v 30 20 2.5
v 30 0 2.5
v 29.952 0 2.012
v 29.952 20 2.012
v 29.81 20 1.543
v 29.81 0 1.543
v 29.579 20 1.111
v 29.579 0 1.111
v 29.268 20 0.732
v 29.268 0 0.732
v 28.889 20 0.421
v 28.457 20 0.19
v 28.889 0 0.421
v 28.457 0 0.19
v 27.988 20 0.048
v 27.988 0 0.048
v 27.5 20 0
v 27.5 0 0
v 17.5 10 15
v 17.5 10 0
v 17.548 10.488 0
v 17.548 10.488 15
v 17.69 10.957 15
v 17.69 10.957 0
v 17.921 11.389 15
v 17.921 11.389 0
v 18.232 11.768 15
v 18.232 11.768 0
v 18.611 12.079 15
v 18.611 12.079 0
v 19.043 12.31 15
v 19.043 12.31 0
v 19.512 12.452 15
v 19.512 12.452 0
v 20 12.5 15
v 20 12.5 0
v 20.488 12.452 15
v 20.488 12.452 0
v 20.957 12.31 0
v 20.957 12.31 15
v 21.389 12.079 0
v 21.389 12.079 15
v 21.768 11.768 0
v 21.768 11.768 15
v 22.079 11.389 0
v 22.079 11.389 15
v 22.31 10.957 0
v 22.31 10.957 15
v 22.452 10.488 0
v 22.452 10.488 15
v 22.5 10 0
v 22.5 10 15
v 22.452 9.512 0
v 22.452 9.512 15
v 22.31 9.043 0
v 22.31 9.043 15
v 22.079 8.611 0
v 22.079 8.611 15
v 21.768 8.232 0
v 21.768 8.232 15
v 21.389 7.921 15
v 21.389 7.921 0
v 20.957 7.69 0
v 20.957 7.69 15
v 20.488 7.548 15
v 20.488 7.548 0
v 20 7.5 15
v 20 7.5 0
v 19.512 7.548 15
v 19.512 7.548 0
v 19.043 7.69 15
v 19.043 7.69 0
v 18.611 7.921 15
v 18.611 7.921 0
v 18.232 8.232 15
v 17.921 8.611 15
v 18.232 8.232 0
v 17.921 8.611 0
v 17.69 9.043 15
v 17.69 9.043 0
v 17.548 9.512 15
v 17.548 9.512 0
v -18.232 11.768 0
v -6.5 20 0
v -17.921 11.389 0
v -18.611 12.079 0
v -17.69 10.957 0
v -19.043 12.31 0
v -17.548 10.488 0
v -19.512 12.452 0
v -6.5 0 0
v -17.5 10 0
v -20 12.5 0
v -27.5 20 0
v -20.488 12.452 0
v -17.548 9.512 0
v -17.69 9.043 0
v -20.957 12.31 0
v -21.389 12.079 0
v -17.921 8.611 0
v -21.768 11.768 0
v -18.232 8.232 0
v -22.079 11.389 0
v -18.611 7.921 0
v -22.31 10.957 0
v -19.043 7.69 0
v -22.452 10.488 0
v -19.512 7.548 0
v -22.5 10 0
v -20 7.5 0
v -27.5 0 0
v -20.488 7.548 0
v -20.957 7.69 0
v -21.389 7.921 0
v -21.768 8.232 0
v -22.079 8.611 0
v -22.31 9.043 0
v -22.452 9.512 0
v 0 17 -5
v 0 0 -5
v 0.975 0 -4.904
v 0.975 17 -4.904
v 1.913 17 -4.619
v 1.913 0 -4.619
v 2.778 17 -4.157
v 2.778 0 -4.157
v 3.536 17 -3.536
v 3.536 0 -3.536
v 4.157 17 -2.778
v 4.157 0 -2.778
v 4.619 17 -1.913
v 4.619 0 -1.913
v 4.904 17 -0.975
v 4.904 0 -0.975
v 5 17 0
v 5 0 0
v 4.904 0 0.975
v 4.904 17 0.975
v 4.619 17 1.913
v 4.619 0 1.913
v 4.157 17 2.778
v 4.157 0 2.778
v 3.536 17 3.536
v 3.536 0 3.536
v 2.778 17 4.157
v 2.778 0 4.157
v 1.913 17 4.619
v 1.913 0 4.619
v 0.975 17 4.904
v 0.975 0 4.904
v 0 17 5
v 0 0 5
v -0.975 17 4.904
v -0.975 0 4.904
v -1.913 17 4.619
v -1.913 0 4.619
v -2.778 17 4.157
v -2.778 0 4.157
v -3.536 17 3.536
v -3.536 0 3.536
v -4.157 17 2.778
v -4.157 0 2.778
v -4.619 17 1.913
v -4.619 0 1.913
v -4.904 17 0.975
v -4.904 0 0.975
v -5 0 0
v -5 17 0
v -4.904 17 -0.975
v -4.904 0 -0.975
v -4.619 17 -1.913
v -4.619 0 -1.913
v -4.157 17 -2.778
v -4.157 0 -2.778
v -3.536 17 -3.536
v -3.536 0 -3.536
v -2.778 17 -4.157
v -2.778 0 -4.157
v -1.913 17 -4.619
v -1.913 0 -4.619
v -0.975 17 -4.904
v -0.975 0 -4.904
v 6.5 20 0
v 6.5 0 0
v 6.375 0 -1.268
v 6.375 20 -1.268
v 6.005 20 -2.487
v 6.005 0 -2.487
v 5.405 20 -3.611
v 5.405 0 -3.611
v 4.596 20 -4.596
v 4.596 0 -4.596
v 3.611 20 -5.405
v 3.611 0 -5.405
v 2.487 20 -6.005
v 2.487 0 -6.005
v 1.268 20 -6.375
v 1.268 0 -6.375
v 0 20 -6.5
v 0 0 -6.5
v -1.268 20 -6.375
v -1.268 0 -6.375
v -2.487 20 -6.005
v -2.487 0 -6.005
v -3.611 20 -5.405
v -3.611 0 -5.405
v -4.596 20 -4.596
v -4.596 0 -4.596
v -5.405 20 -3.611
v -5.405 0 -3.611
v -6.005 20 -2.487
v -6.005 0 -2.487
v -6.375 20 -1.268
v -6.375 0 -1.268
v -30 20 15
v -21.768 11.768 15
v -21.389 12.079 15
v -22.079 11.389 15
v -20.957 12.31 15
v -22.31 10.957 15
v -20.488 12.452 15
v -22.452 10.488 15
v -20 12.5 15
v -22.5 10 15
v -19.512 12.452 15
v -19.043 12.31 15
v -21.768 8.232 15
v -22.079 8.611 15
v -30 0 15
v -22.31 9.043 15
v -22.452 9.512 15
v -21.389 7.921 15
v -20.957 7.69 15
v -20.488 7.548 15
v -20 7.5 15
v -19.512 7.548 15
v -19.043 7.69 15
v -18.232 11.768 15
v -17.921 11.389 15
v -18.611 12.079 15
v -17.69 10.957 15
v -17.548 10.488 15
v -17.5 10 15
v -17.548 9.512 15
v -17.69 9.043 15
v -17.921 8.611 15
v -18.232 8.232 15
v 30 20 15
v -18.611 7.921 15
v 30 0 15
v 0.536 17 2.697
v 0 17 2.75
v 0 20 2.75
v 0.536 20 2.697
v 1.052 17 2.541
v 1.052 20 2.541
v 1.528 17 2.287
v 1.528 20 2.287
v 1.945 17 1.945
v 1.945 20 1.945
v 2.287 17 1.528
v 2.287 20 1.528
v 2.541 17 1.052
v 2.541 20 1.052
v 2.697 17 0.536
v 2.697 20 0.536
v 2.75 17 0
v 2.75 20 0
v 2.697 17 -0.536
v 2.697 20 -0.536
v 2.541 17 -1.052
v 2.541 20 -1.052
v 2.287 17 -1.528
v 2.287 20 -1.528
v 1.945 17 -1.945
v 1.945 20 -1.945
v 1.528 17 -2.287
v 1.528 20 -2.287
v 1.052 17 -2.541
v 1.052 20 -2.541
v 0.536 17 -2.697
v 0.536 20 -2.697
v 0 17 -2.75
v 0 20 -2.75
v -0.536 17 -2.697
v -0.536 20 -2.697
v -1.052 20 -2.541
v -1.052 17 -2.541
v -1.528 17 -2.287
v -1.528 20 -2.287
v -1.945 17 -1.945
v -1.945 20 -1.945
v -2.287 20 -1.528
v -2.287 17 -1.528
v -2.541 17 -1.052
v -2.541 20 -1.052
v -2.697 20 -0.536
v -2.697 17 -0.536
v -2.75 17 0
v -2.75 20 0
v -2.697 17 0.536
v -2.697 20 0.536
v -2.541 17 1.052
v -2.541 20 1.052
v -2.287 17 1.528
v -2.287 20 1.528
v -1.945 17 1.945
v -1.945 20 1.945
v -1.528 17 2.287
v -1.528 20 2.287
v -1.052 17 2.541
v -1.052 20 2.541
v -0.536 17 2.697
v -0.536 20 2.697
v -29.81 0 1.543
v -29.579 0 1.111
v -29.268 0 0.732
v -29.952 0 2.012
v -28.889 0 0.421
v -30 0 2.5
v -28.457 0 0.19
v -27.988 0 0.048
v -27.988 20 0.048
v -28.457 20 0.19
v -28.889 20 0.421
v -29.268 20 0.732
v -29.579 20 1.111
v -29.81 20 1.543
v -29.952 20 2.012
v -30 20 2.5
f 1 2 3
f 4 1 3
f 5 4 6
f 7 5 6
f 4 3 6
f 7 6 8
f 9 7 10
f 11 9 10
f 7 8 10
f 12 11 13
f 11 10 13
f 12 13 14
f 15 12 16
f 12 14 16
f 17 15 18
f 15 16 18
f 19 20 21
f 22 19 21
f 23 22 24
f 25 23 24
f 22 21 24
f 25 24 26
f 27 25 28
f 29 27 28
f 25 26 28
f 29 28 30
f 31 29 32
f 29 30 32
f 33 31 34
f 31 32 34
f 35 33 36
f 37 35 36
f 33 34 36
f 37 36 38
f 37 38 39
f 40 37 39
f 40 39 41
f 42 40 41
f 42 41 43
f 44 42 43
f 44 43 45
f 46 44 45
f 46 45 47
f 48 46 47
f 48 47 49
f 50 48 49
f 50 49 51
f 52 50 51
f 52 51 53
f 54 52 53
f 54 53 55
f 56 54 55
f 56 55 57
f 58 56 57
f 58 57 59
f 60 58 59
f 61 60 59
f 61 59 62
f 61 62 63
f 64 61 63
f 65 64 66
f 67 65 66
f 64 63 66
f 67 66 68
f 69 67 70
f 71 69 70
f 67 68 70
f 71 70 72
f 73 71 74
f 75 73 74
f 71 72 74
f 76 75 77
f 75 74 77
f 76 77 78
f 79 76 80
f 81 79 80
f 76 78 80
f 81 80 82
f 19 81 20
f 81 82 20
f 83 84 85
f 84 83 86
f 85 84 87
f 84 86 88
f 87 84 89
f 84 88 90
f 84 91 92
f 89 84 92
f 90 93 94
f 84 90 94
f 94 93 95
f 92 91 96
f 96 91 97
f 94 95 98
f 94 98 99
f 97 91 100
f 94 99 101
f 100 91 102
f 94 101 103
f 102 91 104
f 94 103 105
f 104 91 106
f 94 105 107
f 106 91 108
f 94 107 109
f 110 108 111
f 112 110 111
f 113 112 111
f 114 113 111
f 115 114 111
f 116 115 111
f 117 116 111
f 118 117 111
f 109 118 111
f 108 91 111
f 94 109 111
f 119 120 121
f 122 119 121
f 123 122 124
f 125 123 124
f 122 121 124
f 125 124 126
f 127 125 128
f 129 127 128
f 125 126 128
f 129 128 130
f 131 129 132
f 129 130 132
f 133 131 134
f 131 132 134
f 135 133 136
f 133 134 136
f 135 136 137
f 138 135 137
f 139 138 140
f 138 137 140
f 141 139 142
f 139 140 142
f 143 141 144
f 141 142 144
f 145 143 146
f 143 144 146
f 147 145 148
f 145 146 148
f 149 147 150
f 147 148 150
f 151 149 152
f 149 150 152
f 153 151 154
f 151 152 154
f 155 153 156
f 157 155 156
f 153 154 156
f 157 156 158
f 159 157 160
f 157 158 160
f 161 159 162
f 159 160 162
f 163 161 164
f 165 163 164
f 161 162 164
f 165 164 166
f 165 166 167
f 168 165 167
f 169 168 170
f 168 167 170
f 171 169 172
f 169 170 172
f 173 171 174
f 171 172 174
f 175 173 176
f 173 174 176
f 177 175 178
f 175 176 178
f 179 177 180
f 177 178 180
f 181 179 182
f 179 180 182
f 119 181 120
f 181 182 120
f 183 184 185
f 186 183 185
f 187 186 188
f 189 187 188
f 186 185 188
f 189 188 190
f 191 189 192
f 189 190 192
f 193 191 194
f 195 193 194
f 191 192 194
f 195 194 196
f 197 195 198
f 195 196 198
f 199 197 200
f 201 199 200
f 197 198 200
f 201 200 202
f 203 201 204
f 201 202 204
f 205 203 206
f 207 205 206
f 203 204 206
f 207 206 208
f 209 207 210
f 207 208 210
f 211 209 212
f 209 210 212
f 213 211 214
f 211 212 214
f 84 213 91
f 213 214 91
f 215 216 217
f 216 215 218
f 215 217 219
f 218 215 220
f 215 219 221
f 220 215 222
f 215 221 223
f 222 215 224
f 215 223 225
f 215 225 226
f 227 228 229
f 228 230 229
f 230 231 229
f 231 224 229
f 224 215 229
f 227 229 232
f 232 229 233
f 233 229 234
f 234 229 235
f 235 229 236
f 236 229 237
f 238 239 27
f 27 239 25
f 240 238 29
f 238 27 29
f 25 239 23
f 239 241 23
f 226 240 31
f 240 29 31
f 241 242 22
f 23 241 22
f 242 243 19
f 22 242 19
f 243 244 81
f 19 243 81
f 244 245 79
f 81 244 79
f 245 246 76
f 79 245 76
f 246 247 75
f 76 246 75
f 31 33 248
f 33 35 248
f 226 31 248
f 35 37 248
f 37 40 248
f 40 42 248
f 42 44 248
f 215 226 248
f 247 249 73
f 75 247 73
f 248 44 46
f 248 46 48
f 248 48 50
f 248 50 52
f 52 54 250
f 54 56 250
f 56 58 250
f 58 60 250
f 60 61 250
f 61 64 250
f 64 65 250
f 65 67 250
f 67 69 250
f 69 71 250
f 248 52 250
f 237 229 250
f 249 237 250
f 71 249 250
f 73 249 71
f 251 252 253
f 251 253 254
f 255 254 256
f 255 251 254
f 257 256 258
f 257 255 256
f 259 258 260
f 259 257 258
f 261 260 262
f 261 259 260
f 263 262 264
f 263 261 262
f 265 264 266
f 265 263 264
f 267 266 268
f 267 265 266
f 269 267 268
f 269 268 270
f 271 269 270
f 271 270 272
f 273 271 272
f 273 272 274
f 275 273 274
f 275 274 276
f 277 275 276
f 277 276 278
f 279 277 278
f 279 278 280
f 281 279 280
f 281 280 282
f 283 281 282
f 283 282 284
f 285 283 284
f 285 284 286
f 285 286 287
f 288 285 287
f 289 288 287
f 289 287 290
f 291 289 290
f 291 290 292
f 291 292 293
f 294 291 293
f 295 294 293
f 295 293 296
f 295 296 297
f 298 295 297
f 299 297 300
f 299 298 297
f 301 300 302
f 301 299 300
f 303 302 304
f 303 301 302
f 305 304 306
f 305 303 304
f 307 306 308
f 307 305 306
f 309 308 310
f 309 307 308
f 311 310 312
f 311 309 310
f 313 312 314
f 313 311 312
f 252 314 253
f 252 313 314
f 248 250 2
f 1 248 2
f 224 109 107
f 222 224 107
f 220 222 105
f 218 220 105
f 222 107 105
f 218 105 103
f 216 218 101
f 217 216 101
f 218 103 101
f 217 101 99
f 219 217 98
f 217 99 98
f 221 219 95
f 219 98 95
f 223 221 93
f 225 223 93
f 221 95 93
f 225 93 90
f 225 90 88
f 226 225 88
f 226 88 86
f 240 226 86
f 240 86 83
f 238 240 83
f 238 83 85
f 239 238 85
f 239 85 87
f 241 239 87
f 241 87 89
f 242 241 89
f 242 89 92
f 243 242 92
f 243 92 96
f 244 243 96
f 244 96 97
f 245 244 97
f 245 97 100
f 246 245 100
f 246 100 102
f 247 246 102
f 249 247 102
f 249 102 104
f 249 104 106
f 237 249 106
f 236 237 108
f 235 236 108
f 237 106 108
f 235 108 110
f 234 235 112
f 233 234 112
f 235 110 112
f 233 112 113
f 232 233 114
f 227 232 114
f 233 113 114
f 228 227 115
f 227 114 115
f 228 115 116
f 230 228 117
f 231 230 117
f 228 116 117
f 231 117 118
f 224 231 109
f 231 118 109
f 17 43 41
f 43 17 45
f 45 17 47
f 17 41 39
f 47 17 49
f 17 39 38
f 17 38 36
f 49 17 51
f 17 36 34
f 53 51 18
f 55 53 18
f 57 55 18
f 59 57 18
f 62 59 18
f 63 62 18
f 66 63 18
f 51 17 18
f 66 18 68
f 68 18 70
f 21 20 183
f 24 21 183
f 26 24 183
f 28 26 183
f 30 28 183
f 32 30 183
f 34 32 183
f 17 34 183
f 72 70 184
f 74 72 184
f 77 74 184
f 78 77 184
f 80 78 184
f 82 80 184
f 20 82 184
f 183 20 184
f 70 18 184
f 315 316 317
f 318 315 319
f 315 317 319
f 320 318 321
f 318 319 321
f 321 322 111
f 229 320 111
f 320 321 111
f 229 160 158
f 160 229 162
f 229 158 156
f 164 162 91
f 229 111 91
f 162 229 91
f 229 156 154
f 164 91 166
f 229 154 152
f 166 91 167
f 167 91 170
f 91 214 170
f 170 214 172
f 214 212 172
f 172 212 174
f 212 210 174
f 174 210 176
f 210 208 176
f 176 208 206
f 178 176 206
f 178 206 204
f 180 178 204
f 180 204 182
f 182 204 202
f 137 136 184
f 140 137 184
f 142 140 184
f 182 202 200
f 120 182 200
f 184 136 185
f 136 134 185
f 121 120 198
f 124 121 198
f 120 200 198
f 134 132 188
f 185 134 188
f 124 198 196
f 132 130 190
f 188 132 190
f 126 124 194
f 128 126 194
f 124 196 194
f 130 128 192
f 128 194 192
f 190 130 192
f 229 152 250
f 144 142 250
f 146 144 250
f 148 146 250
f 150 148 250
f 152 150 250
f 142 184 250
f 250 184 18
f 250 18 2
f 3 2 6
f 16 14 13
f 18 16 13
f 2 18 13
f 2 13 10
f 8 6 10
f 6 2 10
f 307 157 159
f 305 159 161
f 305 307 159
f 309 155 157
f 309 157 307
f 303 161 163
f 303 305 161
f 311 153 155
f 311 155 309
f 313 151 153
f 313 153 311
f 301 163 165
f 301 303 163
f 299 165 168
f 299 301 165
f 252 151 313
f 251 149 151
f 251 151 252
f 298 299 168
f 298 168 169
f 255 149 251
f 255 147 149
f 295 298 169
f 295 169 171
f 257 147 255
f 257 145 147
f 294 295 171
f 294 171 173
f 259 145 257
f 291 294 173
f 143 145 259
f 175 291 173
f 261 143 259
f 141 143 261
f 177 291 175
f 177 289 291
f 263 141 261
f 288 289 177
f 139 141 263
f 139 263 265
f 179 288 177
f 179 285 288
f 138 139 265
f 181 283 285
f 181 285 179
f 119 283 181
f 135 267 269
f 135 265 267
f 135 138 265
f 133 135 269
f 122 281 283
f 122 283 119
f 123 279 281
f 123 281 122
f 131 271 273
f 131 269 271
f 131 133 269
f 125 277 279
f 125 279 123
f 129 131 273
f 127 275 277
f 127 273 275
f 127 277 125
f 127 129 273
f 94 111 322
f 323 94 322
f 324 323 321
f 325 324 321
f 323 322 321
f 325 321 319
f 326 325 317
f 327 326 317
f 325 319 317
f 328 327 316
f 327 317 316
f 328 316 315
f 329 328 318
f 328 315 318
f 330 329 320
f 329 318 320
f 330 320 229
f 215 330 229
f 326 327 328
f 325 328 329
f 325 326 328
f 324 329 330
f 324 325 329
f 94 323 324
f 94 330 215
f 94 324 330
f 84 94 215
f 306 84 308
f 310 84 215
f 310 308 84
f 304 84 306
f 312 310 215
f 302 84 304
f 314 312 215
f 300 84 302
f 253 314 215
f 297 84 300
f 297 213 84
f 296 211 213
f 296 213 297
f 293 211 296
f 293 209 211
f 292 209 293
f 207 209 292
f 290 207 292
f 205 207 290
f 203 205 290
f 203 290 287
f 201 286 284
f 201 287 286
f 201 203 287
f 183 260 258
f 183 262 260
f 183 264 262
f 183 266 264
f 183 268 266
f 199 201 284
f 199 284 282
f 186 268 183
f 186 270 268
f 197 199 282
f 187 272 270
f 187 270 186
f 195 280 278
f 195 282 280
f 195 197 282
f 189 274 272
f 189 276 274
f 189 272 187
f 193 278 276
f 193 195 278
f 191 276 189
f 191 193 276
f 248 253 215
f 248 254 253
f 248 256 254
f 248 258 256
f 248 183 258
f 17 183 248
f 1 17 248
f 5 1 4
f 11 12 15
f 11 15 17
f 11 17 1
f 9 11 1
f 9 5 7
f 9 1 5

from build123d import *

# Parameters (mm, degrees)
ESQUISSE2_R             = 2.75
BOSS_EXTRU_1_DEPTH      = 20
ESQUISSE3_R             = 2.5
ENL_V_MAT_EXTRU_1_DEPTH = 20
ESQUISSE4_R             = 5
ESQUISSE4_R_2           = 2.75
ENL_V_MAT_EXTRU_2_DEPTH = 17


with BuildPart() as part:
    # Esquisse2 → Boss.-Extru.1 (new body)
    with BuildSketch(Plane(origin=(0, 0, 0), x_dir=(1, 0, 0), z_dir=(0, 1, 0))):
        with BuildLine():
            Line((-6.5, 0), (-27.5, 0))
            ThreePointArc((-27.5, 0), (-29.267766953, -0.732233047), (-30, -2.5))
            Line((-30, -2.5), (-30, -15))
            Line((-30, -15), (30, -15))
            Line((30, -15), (30, -2.5))
            ThreePointArc((30, -2.5), (29.267766953, -0.732233047), (27.5, 0))
            Line((27.5, 0), (6.5, 0))
            ThreePointArc((6.5, 0), (0, 6.5), (-6.5, 0))
        make_face()
        with Locations(Location((0, 0, 0), (0, 0, 270))):
            Circle(ESQUISSE2_R, mode=Mode.SUBTRACT)
    extrude(amount=BOSS_EXTRU_1_DEPTH)

    # Esquisse3 → Enlèv. mat.-Extru.1 (cut)
    with BuildSketch(Plane(origin=(0, 0, 0), x_dir=(-1, 0, 0), z_dir=(0, 0, -1))):
        with Locations((-20, 10)):
            Circle(ESQUISSE3_R)
        with Locations((20, 10)):
            Circle(ESQUISSE3_R)
    extrude(amount=-ENL_V_MAT_EXTRU_1_DEPTH, mode=Mode.SUBTRACT)

    # Esquisse4 → Enlèv. mat.-Extru.2 (cut)
    with BuildSketch(Plane.XZ):
        with Locations(Location((0, 0, 0), (0, 0, 270))):
            Circle(ESQUISSE4_R)
        with Locations(Location((0, 0, 0), (0, 0, 270))):
            Circle(ESQUISSE4_R_2, mode=Mode.SUBTRACT)
    extrude(amount=-ENL_V_MAT_EXTRU_2_DEPTH, mode=Mode.SUBTRACT)


solid = part.part
